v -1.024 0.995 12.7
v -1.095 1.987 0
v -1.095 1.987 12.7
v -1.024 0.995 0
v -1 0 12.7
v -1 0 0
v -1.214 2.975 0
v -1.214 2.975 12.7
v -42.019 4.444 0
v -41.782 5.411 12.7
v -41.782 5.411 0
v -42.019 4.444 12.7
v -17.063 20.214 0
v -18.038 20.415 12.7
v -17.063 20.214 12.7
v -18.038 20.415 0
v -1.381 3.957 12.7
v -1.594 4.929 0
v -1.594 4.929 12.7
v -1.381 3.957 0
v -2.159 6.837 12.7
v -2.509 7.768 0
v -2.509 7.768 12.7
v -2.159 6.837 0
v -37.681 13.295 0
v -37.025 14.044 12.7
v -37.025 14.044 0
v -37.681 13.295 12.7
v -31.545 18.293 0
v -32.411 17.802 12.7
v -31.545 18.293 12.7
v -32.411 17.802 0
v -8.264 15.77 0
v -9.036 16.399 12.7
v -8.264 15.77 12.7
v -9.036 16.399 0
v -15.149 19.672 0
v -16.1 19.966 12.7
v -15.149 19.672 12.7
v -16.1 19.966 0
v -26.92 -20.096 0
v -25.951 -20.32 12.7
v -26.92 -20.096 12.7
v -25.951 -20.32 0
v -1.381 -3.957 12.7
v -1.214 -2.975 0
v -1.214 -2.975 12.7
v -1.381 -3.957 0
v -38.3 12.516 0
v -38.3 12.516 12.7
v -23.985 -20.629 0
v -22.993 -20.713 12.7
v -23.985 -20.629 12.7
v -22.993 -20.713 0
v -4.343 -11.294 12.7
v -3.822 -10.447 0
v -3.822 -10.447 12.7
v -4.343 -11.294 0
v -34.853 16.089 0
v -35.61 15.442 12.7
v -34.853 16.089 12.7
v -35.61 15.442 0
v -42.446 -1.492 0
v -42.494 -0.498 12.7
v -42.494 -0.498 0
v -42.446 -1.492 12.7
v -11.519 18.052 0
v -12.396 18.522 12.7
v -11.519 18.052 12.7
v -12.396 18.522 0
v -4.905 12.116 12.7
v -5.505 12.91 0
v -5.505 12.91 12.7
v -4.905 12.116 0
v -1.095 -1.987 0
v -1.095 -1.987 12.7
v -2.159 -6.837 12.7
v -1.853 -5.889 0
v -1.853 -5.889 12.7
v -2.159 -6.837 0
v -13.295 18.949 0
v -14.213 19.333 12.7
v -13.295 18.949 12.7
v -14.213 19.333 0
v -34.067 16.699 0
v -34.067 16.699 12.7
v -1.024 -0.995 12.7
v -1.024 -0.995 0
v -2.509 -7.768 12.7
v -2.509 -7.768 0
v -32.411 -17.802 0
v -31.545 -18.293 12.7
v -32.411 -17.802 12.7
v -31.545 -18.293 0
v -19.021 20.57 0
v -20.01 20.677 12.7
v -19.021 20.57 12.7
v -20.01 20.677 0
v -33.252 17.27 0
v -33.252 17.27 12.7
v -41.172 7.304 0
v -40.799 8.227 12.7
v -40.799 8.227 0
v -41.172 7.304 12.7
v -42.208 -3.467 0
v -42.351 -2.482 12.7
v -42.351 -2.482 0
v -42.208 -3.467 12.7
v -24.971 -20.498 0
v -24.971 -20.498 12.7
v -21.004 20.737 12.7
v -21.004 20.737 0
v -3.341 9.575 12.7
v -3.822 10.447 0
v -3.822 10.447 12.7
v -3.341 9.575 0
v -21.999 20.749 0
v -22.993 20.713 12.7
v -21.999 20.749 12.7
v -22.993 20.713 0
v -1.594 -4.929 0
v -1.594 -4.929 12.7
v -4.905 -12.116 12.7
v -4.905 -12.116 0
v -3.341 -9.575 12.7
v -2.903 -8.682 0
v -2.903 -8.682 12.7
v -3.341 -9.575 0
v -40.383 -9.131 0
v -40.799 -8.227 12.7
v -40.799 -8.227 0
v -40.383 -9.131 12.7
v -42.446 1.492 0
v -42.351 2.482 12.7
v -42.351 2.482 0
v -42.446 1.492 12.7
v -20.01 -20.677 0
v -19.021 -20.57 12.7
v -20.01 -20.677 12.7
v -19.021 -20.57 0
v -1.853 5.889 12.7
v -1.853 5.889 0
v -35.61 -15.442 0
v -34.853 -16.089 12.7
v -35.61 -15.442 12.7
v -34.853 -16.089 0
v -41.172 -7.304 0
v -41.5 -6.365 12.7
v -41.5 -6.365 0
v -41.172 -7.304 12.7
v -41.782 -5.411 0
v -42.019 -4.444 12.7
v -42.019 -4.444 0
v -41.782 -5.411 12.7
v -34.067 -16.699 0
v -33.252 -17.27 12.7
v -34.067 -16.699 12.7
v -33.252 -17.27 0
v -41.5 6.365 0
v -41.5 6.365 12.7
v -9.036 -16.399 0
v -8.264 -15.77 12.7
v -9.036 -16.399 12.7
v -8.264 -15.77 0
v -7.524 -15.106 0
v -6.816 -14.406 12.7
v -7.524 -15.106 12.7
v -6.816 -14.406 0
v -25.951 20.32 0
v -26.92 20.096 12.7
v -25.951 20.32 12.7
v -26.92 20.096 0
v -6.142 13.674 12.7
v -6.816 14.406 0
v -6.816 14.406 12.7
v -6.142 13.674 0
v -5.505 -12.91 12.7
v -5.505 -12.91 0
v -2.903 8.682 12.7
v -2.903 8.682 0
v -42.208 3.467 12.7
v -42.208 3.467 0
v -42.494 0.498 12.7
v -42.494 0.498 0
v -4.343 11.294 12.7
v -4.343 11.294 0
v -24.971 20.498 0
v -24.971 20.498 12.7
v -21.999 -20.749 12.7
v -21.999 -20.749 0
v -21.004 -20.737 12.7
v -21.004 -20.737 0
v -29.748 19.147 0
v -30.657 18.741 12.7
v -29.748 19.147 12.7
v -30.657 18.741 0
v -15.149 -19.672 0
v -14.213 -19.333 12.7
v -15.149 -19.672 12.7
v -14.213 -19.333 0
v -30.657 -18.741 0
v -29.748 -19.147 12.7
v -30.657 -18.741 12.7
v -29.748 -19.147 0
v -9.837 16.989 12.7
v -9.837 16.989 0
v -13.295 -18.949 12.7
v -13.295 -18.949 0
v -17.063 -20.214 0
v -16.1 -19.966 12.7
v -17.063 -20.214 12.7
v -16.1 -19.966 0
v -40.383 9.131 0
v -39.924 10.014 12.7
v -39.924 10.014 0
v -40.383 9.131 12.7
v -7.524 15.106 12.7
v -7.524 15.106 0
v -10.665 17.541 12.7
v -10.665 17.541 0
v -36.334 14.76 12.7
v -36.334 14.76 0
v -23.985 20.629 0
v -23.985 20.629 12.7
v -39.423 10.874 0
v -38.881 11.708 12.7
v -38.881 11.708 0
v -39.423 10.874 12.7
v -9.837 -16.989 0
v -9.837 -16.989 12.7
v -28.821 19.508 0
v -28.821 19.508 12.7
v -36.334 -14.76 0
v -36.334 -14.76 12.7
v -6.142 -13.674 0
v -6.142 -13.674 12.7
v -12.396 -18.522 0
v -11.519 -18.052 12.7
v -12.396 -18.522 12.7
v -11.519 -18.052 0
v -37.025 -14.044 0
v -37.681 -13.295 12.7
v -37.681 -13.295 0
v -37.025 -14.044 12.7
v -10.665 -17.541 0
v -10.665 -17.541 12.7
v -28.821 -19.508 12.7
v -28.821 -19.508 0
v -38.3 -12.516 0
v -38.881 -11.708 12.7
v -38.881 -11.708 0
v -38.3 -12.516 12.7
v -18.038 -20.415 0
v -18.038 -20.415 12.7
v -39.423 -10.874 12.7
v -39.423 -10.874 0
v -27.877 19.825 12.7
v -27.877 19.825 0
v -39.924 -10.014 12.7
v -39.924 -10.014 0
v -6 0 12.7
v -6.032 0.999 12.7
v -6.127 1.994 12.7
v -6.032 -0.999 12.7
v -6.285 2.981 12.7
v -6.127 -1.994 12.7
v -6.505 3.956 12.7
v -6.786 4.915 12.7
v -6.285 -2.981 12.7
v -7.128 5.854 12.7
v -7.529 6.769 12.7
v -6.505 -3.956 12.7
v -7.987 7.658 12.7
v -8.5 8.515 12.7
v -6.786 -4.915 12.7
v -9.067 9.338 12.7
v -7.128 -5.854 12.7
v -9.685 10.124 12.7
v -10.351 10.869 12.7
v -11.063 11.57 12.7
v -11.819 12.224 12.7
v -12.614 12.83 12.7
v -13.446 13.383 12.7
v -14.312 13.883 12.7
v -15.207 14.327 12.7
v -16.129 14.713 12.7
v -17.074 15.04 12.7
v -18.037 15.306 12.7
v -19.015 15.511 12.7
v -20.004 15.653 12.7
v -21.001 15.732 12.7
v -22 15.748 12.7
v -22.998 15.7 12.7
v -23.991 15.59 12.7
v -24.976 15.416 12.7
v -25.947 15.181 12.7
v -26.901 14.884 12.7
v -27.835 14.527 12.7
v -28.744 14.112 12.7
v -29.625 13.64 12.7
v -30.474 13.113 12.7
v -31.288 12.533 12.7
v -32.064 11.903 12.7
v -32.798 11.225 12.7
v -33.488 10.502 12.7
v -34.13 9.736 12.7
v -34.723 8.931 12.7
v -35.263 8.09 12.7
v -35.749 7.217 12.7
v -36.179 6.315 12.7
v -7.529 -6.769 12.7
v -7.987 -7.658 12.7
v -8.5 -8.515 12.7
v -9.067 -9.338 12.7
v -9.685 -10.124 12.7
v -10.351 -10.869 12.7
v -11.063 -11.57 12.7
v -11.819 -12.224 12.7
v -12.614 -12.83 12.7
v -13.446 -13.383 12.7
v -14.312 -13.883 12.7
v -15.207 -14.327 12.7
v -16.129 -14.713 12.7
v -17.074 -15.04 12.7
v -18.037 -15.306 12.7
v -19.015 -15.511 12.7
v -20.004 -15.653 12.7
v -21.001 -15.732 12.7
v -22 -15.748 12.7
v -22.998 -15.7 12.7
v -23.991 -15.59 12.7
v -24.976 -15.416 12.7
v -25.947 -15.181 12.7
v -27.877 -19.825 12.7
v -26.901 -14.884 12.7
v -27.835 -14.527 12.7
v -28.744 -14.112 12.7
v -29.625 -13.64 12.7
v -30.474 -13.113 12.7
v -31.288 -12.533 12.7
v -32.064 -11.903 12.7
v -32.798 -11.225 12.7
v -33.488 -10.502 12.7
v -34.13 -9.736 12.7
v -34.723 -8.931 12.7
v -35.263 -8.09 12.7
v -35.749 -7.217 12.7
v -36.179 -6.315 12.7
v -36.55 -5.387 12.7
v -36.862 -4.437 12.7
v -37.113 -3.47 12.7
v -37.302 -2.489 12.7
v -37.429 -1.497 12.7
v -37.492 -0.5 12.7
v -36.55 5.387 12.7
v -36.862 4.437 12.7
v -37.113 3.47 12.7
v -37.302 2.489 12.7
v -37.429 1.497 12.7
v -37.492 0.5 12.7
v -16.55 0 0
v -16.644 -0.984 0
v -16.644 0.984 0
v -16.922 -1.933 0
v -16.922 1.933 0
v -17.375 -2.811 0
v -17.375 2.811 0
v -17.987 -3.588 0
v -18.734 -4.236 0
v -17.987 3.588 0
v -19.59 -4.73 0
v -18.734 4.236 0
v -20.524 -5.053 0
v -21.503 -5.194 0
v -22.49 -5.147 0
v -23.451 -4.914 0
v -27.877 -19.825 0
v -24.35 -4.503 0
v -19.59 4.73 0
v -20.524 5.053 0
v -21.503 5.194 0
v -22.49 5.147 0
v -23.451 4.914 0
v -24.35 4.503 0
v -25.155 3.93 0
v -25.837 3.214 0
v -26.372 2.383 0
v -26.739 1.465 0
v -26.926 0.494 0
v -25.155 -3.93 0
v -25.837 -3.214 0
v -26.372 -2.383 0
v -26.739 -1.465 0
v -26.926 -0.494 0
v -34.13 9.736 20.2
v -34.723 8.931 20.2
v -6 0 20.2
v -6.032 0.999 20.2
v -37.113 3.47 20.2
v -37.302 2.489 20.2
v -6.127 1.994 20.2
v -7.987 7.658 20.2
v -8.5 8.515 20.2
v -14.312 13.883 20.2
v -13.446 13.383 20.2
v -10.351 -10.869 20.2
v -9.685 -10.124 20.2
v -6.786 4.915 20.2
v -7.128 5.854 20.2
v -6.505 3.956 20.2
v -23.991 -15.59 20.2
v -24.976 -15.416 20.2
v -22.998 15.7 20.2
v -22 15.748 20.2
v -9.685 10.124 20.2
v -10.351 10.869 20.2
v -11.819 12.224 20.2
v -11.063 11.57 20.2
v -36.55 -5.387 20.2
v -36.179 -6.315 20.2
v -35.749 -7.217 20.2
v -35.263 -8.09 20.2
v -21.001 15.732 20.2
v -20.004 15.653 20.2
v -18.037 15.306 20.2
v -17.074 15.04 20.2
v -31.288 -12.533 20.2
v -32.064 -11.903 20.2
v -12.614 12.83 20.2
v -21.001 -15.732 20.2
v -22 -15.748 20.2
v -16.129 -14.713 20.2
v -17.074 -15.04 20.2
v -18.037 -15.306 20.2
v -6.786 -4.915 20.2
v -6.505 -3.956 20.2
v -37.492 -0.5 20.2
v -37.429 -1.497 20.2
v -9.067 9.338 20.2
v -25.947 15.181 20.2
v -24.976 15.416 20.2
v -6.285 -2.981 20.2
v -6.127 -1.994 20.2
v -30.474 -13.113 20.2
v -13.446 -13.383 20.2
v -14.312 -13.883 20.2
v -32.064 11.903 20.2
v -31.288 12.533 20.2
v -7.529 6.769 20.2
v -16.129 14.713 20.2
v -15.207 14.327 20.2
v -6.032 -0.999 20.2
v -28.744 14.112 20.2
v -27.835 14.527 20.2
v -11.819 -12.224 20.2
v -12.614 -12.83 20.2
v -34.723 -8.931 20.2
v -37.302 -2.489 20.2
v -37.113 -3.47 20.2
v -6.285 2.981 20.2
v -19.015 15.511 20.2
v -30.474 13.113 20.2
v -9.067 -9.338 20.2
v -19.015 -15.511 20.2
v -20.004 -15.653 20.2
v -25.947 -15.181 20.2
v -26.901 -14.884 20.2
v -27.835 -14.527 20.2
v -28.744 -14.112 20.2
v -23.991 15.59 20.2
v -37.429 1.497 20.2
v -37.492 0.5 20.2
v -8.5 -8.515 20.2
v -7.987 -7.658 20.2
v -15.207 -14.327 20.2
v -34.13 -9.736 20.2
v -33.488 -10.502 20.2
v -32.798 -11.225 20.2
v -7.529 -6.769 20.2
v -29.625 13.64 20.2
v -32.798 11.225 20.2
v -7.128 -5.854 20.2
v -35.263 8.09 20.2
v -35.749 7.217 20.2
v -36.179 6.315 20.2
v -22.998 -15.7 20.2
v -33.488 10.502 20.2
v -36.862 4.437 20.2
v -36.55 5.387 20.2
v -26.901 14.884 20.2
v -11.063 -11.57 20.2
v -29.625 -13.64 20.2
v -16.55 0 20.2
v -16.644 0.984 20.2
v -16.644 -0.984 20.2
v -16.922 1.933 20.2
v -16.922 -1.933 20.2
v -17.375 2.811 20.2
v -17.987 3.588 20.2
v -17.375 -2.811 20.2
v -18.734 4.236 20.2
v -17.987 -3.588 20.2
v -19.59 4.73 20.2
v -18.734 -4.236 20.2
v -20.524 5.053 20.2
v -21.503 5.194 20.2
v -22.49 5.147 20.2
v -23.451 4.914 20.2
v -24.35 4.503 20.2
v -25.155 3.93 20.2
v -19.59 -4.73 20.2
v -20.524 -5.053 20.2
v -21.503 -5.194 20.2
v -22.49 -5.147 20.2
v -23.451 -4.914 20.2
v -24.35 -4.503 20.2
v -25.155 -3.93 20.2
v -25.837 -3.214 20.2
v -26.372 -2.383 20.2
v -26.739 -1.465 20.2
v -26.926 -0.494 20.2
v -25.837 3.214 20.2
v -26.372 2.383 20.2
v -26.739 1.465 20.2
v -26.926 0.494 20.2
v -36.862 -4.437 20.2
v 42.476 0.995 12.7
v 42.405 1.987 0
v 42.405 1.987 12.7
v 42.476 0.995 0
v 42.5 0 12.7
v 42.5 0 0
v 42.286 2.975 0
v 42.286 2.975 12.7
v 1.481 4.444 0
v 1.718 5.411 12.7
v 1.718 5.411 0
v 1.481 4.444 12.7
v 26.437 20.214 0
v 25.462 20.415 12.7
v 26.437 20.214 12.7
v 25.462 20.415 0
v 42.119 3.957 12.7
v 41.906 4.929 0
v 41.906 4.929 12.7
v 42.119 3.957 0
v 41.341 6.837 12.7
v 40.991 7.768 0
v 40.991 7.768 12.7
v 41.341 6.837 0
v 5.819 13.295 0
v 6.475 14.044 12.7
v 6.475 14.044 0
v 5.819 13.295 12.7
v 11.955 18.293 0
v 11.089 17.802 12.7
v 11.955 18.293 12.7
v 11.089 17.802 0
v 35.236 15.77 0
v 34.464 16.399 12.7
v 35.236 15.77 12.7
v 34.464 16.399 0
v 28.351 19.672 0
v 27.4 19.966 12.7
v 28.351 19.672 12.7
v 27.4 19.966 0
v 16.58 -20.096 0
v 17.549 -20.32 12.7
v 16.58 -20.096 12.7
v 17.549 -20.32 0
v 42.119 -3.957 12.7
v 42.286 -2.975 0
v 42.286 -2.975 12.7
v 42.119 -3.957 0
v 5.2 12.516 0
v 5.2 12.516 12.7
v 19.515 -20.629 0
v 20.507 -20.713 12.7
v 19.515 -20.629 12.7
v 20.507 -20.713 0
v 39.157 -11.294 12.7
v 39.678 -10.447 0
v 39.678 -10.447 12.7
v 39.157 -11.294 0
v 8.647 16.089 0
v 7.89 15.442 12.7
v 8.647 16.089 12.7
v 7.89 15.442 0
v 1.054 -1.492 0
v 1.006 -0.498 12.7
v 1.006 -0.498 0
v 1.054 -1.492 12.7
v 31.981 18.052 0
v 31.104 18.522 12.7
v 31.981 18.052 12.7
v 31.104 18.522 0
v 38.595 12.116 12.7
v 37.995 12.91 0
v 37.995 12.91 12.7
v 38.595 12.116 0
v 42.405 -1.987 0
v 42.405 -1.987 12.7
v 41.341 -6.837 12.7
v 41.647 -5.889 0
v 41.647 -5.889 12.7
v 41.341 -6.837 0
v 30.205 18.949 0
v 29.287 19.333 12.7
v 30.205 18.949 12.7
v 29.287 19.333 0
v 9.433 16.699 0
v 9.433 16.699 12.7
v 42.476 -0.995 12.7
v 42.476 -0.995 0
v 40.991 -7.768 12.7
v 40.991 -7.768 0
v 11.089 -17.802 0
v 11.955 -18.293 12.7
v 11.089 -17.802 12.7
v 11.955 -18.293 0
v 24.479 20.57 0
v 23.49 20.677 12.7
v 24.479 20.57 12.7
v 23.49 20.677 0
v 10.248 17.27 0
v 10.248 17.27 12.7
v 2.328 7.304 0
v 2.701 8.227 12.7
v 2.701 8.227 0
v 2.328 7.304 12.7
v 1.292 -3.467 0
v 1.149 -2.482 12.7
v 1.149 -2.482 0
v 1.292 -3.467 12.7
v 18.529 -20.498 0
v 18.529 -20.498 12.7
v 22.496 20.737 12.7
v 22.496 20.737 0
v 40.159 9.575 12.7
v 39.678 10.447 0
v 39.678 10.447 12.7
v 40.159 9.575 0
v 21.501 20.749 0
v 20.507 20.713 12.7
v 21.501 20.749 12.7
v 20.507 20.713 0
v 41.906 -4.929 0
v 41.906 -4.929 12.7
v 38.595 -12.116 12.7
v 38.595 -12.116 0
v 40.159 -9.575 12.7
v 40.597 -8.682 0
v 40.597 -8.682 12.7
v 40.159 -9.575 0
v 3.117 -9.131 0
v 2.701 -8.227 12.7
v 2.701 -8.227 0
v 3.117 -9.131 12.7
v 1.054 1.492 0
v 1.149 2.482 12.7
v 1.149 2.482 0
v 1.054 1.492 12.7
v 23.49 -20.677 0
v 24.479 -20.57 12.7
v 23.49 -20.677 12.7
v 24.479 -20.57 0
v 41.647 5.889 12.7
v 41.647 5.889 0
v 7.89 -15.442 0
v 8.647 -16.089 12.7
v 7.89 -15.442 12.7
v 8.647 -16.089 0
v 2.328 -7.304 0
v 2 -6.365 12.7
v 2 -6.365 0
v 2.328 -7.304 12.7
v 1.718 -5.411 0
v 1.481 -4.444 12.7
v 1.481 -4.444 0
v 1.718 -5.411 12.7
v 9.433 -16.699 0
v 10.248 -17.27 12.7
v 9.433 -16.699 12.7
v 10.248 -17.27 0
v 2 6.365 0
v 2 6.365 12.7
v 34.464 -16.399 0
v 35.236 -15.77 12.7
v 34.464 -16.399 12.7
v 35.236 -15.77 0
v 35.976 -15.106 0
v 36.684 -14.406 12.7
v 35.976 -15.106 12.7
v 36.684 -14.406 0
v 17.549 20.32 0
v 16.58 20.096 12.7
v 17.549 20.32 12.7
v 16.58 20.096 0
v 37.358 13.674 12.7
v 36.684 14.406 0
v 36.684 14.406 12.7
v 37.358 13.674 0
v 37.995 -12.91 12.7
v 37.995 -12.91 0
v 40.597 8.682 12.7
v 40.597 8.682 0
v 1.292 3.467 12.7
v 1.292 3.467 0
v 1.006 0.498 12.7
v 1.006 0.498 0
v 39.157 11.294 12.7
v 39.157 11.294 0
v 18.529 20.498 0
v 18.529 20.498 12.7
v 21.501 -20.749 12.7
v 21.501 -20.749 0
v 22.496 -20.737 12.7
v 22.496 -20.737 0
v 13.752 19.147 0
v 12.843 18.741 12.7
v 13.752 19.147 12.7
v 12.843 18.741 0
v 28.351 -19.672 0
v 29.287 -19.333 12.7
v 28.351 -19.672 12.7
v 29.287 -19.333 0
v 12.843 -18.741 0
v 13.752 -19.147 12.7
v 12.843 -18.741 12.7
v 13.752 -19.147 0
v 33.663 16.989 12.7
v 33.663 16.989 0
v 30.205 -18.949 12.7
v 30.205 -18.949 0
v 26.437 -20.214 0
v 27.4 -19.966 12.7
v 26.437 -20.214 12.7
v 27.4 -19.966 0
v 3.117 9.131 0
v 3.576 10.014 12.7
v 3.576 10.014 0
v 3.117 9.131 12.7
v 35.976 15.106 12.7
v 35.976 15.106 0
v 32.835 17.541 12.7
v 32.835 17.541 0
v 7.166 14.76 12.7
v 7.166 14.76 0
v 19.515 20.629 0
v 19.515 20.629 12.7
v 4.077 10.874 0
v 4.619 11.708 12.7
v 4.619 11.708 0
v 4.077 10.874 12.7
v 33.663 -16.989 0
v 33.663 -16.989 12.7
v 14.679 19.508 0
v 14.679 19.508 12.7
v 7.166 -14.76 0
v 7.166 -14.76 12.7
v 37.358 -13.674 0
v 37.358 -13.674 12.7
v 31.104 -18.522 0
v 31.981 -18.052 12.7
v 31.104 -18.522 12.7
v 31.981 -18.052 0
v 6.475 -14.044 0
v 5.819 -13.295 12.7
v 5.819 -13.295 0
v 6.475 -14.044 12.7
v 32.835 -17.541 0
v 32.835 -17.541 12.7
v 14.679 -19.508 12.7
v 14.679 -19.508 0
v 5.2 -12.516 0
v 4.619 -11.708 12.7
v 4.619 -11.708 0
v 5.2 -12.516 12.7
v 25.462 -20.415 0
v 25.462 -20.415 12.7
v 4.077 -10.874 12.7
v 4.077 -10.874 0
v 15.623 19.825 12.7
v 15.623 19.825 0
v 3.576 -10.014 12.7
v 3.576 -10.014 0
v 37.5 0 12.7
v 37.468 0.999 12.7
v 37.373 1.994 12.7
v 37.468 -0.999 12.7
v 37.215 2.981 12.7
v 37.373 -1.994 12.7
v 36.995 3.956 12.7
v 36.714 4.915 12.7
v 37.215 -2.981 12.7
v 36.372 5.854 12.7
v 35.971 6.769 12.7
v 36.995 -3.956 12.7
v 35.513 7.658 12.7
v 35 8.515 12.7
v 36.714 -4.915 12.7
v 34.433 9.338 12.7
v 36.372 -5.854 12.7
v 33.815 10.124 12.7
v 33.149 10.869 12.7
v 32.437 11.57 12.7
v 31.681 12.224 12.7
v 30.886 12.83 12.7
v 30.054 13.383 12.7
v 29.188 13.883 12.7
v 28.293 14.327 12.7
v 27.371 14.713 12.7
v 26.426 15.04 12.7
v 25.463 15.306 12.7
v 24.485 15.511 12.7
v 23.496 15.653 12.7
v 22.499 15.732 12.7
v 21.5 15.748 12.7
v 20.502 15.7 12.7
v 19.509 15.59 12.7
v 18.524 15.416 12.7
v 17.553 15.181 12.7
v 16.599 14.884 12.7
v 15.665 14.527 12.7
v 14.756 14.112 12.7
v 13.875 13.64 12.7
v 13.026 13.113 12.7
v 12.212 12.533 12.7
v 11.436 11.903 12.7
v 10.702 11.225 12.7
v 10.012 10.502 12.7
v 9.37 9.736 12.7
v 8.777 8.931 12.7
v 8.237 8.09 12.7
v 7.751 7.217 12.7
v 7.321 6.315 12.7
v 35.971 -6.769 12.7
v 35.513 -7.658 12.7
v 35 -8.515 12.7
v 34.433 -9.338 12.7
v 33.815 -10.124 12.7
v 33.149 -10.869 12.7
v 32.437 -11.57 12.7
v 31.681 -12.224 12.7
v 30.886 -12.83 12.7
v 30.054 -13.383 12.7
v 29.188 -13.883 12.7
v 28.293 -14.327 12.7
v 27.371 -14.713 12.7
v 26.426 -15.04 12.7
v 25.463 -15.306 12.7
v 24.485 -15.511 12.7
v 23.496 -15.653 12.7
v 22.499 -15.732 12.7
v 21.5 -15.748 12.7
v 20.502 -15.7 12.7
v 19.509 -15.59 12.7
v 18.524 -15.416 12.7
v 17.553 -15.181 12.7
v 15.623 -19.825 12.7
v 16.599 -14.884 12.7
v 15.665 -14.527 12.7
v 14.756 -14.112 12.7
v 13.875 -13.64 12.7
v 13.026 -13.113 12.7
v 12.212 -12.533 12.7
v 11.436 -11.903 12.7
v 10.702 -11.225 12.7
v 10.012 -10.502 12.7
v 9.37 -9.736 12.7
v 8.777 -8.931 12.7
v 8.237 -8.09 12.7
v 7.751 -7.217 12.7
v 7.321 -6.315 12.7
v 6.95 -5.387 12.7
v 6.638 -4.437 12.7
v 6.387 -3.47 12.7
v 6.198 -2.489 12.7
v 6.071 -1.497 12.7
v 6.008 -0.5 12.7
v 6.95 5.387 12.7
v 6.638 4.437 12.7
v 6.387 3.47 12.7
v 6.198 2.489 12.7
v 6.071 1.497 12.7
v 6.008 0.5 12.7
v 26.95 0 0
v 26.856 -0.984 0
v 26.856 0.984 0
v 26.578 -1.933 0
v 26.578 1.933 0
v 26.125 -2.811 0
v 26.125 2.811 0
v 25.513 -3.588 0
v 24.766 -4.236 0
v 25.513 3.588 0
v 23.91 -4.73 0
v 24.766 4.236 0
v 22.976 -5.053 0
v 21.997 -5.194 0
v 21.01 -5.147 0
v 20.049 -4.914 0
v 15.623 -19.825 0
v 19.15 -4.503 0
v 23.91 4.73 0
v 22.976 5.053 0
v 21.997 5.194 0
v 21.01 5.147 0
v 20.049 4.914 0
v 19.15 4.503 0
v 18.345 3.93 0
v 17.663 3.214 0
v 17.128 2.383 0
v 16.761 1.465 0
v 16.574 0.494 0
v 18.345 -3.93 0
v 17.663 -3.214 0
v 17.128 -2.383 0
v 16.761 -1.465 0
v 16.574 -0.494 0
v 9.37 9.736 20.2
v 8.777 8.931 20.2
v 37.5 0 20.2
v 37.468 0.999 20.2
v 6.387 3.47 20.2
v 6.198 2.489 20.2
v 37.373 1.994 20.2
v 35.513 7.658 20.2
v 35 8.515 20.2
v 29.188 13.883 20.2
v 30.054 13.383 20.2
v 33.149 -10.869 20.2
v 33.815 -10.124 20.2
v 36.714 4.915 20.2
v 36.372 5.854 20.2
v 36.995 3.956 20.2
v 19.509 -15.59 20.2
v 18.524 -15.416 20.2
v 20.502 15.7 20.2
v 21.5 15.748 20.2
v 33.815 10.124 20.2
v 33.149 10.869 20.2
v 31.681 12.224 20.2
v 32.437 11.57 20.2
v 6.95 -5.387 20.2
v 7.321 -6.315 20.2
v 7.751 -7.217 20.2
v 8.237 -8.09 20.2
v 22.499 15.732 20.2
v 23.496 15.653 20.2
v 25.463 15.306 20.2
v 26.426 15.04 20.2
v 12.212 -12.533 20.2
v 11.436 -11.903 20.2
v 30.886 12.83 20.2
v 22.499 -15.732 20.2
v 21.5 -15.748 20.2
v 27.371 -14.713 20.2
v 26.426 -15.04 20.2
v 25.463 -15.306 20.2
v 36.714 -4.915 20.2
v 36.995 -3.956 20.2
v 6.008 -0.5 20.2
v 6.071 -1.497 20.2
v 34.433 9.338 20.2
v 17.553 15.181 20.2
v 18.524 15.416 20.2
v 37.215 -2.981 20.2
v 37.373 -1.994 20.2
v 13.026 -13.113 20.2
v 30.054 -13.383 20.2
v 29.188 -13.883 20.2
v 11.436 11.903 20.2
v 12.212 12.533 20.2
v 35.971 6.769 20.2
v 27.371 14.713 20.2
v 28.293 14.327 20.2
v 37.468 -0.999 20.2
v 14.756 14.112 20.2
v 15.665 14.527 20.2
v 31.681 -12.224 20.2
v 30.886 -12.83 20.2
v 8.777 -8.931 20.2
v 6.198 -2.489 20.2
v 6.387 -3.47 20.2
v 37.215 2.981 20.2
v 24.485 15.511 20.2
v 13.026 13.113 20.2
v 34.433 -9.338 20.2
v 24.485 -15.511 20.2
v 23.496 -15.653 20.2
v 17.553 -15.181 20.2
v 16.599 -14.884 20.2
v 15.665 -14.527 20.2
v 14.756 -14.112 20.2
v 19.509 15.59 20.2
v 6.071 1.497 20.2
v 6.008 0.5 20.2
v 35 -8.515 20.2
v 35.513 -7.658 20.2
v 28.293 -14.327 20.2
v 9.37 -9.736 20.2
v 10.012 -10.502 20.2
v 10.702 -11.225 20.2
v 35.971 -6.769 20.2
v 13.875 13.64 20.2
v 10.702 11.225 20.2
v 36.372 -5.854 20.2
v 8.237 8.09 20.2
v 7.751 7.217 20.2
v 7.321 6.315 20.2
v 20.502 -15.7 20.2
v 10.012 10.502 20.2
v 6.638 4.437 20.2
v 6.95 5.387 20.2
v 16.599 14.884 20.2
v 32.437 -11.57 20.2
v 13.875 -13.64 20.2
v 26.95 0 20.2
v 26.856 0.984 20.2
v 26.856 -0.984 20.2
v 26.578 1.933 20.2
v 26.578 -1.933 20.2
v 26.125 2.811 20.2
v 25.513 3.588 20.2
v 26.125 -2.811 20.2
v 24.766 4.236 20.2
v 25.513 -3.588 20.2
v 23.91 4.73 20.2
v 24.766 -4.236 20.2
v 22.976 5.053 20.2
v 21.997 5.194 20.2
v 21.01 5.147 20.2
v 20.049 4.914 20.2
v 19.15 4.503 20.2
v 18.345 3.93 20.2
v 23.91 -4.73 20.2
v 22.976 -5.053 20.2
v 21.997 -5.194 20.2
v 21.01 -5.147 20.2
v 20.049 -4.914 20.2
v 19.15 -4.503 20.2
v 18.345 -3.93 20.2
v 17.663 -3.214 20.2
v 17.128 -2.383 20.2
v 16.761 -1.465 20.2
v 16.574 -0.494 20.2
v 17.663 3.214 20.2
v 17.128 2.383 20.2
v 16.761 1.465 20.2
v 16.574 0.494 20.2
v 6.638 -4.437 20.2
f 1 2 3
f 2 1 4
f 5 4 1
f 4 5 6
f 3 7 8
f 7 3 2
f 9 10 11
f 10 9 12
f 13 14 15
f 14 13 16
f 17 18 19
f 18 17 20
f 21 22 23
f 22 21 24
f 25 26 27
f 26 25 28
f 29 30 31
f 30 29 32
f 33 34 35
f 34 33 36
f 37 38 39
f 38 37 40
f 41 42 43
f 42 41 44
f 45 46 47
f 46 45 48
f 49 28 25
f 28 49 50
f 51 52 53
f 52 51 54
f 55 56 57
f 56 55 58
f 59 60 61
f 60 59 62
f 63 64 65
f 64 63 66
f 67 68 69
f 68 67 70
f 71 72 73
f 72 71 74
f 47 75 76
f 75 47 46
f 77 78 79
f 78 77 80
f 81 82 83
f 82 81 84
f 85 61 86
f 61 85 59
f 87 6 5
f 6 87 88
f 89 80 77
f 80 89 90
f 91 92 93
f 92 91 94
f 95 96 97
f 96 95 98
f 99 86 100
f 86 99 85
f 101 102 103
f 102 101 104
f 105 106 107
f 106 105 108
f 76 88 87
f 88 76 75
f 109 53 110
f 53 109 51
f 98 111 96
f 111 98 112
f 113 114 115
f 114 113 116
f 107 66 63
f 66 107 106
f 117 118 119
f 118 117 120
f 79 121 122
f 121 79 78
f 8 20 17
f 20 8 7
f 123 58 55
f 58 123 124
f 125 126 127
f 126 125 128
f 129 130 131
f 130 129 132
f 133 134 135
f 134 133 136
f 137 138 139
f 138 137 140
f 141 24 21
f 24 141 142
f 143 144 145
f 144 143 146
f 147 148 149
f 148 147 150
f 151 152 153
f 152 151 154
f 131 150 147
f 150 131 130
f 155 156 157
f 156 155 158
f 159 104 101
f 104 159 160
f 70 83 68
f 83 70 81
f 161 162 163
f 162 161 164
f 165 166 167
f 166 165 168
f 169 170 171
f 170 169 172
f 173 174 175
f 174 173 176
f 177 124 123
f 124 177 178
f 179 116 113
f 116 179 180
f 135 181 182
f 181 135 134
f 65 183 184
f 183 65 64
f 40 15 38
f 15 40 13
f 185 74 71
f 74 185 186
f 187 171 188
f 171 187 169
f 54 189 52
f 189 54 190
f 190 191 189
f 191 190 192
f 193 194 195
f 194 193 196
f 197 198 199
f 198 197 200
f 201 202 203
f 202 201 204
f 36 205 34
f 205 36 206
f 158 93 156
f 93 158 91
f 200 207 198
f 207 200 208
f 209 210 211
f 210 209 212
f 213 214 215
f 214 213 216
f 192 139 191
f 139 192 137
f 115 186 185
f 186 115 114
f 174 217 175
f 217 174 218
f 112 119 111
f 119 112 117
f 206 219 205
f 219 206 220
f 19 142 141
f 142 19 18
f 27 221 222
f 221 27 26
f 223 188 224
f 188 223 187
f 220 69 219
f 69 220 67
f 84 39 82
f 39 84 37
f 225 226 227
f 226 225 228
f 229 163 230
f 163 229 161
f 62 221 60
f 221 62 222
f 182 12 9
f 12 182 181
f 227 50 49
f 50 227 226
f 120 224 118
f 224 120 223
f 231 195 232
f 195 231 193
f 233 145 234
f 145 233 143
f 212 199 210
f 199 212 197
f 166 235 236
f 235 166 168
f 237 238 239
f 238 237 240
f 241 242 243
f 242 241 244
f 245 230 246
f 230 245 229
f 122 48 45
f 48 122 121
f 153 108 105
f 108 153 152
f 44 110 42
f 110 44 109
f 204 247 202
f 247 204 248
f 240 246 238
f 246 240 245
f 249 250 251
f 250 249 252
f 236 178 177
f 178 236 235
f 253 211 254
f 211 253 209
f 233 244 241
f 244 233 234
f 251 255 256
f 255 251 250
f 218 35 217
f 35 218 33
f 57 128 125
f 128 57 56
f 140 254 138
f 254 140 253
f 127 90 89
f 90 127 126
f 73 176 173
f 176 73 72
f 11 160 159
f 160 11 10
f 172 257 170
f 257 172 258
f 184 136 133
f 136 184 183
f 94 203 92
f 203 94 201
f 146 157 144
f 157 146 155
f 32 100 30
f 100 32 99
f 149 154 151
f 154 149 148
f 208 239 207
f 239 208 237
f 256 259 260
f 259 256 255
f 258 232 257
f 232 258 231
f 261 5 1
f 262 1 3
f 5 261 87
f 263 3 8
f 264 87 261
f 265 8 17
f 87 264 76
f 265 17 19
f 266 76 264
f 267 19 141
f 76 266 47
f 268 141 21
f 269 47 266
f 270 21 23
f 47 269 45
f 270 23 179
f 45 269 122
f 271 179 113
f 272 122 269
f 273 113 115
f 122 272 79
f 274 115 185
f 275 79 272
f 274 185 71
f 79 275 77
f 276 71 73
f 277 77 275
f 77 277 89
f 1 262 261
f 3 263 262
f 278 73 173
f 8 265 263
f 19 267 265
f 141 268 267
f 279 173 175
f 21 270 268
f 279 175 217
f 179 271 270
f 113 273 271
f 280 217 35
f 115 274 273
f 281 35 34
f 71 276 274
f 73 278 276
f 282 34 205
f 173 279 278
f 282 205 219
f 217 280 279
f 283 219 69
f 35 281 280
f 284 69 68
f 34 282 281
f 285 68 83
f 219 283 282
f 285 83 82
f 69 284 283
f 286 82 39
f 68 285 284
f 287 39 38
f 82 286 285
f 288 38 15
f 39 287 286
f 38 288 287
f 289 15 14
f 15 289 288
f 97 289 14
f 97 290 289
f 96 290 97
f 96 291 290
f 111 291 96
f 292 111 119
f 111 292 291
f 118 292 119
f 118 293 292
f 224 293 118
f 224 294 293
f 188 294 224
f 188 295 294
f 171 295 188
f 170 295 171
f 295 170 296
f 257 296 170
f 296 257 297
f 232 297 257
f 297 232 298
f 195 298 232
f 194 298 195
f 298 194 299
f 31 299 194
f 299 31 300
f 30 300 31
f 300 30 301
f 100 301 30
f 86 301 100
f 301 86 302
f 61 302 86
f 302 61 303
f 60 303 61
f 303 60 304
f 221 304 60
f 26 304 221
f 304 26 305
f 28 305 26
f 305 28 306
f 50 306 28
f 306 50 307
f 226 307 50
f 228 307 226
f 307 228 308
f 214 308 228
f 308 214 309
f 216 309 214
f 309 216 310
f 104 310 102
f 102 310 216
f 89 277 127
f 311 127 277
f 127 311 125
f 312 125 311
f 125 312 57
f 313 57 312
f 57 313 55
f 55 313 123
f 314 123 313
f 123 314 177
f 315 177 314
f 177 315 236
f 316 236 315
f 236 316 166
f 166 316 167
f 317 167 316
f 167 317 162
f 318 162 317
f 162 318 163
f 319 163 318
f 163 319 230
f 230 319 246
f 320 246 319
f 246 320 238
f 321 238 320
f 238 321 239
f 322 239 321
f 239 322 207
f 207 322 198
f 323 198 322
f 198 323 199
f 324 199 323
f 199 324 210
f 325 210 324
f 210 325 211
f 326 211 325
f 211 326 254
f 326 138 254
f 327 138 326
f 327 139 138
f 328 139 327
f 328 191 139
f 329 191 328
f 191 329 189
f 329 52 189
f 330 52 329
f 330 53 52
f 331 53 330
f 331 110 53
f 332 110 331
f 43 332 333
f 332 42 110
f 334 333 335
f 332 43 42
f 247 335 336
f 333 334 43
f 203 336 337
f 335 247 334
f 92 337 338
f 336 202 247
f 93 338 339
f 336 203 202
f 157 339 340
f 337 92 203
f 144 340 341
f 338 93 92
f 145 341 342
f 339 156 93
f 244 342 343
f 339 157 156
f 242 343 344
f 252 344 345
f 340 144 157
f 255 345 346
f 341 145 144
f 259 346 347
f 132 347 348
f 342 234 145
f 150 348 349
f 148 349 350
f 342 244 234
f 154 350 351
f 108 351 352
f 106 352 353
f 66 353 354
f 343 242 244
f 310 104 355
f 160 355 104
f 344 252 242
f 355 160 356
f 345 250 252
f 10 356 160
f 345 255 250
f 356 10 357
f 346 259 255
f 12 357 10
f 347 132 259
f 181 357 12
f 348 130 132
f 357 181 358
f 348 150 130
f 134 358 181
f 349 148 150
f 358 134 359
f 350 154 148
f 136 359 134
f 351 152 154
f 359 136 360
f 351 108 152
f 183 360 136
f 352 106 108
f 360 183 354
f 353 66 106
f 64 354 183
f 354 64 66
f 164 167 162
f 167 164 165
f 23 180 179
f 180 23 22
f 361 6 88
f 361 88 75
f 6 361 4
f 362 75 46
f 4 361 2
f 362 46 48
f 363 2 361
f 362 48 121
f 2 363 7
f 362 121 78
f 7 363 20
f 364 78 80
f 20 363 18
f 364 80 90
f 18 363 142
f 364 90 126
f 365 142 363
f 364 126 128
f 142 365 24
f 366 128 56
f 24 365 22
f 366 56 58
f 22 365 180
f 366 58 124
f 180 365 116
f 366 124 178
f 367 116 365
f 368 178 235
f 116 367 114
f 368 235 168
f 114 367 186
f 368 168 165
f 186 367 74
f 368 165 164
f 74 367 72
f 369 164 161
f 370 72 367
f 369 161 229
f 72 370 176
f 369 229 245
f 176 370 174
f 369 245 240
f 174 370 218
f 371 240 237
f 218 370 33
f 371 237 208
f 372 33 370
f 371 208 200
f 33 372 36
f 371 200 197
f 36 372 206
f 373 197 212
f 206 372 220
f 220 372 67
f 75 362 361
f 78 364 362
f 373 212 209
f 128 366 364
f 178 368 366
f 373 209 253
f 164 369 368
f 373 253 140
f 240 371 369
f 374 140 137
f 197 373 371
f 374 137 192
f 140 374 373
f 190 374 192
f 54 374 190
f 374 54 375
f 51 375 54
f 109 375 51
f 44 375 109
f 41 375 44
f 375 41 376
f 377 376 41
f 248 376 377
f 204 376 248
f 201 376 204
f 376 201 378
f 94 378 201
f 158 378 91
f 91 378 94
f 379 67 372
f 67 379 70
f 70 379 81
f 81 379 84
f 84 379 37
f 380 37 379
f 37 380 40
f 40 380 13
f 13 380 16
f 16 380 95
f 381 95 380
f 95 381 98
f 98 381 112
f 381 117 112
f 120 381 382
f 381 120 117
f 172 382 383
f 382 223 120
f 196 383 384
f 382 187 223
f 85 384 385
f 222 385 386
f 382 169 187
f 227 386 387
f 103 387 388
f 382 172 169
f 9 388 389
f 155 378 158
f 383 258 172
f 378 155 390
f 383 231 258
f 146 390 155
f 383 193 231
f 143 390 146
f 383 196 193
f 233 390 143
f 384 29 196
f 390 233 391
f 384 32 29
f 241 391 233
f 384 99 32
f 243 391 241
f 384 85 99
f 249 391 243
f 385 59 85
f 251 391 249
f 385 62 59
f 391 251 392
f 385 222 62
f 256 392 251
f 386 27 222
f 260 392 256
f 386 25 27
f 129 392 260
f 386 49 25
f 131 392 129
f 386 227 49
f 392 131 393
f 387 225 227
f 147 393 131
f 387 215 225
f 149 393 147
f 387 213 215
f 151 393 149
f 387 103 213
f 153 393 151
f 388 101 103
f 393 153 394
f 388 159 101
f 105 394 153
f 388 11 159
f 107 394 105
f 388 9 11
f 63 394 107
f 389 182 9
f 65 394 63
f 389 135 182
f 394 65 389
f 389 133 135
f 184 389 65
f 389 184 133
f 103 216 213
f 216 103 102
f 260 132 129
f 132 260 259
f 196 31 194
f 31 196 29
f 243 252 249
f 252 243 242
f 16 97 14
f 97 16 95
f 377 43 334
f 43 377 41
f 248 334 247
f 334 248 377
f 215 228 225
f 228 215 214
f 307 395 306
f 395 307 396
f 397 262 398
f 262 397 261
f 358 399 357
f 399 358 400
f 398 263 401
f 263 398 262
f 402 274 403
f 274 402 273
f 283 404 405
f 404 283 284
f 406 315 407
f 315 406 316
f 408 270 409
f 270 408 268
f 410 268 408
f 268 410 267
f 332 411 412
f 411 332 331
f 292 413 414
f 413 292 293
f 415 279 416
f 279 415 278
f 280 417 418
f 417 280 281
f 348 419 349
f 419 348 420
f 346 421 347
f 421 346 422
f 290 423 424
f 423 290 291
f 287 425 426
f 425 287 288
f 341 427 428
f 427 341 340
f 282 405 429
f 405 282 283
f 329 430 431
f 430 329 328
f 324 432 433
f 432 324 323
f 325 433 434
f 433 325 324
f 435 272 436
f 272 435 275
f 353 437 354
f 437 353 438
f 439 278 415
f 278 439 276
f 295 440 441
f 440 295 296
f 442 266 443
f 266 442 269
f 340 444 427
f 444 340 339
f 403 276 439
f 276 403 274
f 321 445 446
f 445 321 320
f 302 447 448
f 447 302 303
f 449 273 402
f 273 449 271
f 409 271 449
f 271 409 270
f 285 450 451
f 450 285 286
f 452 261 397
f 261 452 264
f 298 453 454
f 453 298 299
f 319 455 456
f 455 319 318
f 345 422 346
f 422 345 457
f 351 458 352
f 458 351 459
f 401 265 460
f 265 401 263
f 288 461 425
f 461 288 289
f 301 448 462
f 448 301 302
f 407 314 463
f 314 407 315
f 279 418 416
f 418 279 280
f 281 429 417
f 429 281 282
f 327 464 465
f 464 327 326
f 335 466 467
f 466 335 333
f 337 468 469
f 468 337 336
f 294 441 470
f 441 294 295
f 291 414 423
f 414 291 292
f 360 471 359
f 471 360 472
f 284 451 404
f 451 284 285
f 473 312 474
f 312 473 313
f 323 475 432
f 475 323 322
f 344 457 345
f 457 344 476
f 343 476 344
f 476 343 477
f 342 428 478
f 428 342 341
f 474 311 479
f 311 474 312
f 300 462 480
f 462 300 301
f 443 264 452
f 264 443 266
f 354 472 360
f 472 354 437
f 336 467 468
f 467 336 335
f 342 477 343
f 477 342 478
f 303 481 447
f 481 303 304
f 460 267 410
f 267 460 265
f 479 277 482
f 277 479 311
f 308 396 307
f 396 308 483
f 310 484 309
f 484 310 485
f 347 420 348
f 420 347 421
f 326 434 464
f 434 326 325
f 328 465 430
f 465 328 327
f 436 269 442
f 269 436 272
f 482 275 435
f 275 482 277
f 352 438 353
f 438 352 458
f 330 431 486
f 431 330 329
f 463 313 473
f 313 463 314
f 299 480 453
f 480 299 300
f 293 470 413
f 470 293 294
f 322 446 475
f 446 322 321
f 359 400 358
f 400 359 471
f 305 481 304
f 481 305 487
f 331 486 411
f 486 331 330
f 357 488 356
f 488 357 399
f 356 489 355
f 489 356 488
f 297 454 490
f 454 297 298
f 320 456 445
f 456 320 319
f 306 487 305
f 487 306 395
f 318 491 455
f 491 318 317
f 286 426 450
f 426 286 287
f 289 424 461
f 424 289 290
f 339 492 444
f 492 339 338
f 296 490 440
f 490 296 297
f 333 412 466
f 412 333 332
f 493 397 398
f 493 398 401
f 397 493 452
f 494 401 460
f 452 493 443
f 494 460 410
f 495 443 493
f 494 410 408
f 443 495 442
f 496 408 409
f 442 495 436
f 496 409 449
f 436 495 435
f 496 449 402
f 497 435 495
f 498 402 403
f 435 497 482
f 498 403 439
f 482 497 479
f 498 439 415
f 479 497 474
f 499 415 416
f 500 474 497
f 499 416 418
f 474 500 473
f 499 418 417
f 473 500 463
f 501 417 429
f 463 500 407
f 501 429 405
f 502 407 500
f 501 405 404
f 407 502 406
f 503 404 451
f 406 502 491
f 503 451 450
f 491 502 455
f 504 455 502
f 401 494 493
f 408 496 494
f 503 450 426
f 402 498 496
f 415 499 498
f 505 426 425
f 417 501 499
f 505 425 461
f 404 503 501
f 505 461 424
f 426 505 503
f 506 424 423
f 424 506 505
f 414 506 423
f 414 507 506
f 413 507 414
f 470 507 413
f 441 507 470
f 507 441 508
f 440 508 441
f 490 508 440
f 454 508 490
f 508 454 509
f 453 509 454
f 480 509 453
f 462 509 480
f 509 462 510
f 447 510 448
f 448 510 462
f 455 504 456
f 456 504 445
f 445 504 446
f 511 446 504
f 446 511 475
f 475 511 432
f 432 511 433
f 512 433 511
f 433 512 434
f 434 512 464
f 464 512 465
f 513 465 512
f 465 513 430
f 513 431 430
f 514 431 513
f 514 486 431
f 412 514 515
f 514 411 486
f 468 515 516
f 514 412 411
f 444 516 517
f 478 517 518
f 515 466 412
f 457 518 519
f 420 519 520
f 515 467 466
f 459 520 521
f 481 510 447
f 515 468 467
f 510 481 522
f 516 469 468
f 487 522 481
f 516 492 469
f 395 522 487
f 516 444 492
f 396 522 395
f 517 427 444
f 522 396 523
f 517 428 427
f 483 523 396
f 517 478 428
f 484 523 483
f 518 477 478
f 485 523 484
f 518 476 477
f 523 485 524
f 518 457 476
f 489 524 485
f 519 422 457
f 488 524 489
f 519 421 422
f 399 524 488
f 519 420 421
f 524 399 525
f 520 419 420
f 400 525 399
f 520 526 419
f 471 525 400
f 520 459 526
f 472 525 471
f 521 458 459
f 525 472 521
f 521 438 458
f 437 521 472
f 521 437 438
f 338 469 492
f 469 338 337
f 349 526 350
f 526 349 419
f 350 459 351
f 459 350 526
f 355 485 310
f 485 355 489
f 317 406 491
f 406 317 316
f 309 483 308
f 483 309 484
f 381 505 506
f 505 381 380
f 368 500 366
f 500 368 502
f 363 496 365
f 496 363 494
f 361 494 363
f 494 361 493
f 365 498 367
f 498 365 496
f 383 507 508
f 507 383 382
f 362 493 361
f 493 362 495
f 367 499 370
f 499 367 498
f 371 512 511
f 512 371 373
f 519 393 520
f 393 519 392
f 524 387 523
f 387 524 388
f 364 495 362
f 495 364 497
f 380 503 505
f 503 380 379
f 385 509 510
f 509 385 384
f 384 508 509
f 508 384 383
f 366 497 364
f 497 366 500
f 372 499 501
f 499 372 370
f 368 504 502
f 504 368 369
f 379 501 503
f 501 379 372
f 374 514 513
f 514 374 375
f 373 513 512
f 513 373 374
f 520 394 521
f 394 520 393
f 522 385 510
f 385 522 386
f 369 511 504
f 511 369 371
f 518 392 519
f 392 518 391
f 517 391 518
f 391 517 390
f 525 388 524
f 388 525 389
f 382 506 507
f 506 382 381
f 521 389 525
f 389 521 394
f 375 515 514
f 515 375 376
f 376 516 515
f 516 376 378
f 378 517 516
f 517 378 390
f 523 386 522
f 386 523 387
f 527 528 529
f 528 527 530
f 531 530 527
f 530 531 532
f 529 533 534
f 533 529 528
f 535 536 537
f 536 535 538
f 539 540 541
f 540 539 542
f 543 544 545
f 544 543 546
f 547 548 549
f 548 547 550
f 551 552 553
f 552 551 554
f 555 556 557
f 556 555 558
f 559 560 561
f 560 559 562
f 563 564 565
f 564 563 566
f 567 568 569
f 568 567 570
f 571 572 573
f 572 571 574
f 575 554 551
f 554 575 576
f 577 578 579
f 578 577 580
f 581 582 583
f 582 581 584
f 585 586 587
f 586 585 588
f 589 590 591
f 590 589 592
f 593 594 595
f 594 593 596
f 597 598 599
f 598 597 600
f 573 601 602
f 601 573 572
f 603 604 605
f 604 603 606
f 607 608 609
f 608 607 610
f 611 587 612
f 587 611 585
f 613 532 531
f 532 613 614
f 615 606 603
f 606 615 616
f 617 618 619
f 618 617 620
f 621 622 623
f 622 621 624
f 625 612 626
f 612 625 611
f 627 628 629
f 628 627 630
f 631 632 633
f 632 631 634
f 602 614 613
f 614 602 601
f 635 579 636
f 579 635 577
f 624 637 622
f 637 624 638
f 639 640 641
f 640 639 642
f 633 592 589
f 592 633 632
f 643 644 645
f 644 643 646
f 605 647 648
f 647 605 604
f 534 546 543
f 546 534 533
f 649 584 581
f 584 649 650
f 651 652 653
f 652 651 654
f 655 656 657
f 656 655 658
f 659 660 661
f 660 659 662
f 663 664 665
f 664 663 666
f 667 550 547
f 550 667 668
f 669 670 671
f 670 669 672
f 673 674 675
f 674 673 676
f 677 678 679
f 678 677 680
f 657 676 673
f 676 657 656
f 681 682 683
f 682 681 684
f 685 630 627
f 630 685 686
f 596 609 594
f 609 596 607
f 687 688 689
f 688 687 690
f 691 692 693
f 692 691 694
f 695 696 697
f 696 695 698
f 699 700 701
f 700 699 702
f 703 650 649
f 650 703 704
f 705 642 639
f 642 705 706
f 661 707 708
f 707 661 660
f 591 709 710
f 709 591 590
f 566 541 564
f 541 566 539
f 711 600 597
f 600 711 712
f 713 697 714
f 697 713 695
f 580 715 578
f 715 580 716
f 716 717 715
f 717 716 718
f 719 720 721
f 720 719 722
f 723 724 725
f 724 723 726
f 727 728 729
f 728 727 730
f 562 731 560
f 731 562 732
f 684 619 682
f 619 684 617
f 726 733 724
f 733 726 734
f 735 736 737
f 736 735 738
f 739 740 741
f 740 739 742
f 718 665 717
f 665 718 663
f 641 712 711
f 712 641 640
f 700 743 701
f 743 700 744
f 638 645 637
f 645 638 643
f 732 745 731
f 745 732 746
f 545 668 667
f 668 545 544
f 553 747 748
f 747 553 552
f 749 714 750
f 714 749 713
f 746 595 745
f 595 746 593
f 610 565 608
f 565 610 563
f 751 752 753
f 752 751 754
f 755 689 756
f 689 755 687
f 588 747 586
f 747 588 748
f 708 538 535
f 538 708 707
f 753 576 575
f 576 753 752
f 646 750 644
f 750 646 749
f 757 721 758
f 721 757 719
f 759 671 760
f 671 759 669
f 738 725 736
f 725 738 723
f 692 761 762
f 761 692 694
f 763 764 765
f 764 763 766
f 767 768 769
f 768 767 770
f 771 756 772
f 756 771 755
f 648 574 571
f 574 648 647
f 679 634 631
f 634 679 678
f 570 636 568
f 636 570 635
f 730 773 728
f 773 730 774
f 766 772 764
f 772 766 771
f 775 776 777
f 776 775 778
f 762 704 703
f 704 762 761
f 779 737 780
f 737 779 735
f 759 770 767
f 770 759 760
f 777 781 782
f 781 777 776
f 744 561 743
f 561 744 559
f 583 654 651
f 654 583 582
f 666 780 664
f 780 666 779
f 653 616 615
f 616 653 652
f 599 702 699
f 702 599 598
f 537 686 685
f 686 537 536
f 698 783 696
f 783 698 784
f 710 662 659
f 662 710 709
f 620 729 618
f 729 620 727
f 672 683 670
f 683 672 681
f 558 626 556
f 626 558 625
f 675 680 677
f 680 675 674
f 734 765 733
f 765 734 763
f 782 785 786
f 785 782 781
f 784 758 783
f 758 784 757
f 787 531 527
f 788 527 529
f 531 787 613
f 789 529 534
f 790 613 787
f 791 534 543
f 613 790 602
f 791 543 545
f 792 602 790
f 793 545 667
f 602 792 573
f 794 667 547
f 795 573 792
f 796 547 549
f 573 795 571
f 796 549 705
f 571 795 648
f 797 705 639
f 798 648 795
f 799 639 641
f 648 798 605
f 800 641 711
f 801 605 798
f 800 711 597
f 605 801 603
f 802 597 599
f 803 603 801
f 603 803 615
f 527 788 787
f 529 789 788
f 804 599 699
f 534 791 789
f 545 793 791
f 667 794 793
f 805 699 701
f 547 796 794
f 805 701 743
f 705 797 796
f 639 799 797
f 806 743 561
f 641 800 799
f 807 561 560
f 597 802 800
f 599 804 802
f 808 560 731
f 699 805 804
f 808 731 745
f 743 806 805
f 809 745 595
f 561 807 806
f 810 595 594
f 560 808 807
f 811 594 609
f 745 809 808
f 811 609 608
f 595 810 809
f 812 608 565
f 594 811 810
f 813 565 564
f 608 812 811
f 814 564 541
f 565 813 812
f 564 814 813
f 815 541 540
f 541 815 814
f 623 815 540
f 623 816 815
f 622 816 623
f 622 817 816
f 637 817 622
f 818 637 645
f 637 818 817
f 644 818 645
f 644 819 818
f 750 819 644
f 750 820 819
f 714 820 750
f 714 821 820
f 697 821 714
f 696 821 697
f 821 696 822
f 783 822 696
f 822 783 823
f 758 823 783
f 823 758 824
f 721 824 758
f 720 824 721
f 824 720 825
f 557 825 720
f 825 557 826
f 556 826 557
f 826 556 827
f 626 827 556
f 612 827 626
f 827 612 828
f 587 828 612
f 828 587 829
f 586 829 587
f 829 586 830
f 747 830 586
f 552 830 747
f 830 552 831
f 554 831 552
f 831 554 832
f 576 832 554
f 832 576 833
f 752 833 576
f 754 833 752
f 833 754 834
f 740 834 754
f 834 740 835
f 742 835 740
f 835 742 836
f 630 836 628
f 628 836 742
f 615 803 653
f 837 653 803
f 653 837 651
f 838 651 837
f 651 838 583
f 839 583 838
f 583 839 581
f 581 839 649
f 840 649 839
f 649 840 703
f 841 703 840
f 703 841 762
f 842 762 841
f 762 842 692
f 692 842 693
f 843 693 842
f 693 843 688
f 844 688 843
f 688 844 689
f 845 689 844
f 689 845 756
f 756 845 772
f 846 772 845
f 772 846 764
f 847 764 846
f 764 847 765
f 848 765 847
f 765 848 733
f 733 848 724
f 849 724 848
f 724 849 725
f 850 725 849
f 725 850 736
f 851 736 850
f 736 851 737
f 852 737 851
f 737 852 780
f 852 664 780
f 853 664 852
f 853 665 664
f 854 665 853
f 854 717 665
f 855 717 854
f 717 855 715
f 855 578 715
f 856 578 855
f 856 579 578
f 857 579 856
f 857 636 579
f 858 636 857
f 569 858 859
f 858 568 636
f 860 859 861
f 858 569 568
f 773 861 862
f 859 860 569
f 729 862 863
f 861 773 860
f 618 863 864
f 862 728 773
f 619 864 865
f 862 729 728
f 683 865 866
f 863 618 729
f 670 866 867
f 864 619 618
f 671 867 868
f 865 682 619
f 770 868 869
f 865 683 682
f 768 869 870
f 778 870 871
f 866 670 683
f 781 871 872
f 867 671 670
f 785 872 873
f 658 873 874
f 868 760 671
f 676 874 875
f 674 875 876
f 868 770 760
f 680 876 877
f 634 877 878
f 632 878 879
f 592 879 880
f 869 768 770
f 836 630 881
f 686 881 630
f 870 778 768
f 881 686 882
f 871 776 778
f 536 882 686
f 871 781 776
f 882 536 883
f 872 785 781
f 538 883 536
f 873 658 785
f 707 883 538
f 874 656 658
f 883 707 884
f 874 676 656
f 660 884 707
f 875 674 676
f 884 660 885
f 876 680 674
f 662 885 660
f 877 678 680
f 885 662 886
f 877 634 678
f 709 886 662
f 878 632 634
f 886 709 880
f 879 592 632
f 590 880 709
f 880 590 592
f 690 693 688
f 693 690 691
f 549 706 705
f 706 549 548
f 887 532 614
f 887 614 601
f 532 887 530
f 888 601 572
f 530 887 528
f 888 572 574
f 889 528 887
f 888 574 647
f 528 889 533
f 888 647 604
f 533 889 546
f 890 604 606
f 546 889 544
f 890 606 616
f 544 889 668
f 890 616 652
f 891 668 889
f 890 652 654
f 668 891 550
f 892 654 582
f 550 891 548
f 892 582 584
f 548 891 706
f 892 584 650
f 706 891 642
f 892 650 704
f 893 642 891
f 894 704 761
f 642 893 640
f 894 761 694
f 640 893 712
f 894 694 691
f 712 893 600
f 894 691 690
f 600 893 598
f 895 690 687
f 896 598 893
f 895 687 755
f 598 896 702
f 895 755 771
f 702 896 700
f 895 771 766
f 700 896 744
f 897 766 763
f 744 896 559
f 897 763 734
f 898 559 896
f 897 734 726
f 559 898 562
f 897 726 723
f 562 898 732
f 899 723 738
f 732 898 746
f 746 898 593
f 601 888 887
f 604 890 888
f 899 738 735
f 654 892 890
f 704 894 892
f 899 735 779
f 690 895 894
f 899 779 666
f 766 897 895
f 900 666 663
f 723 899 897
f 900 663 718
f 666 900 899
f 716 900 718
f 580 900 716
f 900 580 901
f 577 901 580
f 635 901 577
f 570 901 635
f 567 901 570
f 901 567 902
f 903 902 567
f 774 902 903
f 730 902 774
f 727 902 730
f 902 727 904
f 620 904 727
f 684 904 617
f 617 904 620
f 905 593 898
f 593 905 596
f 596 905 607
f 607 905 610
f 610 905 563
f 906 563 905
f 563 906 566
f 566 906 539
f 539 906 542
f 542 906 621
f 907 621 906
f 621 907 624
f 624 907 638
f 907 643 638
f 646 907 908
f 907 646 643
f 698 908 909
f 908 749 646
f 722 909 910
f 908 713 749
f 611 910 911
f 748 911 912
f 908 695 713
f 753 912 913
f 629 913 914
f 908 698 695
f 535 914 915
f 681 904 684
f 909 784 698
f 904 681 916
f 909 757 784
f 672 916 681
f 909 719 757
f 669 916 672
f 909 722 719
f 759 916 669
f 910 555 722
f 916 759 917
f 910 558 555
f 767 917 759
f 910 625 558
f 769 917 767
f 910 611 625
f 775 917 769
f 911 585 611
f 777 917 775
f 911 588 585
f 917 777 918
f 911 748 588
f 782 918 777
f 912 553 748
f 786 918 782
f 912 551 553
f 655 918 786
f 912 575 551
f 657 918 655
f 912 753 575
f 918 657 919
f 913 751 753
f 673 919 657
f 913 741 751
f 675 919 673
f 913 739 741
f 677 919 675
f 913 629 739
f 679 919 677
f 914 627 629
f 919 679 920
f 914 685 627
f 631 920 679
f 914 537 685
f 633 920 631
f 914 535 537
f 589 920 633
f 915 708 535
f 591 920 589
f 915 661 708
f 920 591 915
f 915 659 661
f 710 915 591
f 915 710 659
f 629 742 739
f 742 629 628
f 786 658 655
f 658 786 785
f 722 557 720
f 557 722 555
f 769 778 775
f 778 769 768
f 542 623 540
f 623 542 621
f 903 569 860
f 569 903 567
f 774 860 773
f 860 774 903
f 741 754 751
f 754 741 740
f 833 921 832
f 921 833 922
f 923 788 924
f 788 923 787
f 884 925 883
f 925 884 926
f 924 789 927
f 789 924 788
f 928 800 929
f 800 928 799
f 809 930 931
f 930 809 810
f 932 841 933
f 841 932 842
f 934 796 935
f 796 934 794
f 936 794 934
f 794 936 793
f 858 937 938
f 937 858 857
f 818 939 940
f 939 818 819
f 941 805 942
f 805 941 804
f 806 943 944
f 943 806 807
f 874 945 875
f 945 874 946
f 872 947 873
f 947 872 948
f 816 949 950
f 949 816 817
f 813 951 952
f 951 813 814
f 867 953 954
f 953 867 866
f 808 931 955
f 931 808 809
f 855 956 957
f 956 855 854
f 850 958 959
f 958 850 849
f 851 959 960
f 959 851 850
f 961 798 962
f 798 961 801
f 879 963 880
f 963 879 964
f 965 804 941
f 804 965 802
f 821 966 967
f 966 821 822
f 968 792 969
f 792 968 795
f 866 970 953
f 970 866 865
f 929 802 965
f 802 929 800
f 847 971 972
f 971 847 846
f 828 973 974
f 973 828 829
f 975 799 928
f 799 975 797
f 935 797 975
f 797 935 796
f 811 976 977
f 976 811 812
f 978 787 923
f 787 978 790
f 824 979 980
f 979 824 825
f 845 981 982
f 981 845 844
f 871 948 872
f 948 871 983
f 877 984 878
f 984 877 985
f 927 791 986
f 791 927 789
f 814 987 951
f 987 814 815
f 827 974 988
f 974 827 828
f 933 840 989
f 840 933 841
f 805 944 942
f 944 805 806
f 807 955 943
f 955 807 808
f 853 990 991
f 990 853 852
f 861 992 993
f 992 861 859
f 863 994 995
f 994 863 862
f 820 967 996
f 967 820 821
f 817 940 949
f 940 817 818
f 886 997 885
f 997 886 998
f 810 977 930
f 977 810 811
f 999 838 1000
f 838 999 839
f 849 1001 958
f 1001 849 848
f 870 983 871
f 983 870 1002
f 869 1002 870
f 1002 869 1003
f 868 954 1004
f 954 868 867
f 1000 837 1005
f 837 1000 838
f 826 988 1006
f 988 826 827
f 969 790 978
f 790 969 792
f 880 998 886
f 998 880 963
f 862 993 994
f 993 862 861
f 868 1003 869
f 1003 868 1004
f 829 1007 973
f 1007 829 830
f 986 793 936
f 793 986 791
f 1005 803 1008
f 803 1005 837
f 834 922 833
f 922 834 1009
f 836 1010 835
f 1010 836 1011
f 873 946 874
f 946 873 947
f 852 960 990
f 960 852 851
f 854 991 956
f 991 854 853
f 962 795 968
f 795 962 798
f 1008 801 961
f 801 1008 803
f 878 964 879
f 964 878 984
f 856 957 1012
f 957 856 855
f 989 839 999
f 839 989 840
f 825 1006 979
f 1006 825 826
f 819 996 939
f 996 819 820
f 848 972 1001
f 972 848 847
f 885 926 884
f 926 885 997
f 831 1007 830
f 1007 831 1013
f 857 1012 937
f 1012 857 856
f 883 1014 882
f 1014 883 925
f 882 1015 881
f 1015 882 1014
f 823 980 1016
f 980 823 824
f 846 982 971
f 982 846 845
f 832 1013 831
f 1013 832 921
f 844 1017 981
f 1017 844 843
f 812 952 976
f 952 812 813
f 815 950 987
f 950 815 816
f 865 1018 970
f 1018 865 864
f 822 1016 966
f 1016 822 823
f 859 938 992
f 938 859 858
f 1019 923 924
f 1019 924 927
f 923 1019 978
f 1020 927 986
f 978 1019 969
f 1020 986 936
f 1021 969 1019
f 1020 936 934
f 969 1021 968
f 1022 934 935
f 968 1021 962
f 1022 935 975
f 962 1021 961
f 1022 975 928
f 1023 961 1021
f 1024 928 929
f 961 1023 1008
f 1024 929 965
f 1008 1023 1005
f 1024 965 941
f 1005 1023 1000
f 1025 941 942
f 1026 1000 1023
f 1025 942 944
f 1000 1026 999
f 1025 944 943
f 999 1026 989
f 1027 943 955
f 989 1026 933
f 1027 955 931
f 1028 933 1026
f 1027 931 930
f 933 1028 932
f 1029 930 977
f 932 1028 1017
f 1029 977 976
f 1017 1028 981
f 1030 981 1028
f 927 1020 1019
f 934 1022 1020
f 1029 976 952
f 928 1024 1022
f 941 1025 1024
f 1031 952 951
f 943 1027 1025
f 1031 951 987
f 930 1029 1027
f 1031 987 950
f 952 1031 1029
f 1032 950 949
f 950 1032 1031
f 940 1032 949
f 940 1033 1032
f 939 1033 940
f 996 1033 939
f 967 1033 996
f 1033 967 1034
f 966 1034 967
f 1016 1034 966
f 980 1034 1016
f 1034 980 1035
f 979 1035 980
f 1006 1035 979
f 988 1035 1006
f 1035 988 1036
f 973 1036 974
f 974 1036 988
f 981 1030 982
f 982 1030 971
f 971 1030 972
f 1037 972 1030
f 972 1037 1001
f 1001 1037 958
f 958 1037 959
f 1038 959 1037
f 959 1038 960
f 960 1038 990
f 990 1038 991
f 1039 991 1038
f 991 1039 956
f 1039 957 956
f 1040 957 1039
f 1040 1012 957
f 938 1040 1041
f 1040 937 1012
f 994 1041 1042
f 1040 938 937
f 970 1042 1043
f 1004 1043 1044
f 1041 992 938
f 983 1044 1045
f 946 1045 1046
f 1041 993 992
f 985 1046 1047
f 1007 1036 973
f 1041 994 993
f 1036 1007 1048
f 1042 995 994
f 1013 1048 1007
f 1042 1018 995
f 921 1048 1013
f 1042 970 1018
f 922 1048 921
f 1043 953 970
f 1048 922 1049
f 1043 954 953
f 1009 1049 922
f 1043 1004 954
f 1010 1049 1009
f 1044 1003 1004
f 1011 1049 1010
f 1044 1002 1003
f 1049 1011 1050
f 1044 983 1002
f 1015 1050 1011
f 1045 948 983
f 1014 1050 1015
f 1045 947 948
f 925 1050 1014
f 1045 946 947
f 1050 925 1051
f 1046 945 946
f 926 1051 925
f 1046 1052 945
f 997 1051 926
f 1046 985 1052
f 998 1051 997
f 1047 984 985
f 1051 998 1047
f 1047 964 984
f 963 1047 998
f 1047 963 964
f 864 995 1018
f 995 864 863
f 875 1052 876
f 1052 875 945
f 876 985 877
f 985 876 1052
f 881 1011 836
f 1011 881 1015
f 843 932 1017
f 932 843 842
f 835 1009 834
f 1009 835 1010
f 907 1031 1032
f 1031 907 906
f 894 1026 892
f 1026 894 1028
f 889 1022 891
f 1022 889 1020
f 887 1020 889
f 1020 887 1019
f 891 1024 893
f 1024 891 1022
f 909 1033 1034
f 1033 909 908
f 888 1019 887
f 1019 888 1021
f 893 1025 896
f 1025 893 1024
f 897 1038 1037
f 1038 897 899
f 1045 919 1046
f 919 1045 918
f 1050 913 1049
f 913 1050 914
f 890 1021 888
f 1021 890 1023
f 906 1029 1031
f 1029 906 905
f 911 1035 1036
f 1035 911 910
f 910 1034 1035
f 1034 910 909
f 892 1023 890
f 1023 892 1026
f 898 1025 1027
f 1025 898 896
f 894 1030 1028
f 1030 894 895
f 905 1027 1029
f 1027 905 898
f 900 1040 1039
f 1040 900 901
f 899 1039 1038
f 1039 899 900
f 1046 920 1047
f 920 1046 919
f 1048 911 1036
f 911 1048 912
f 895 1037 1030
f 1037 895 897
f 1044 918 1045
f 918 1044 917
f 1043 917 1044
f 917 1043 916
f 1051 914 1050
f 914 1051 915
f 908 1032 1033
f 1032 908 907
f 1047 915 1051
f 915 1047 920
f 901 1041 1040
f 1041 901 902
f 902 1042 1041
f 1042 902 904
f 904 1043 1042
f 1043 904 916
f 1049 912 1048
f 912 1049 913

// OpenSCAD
// [FL_INDEX: keywords="openscad, 3d_parametric, Customizable_Spool_Adapter, csg_solid" | COT="Parametric OpenSCAD design from 3DCodeverse"]
// Title: Customizable Spool Adapter

//design and code by emanresu (http://www.thingiverse.com/Emanresu)
//Generates two symmetric spool bearings/axel adapters/what have you
//spacer can be used to center the spool on a specific axel,
//or to simply keep the bearing/axel adapter from sliding into the spool


//CUSTOMIZER VARIABLES


//diameter of spool hole (mm)
spool_hole_diameter=31.5;

//distance bearing sticks into spool hole (mm)
spool_hole_depth=15;

//diameter of the axle (mm)
axel_diameter=10.4;

//height of spacer (mm) (useful for centering a spool) 
spacer=12.7;
//e.g. 0 = no spacer; 10 = a 10mm extension of a wider diameter

//extra diameter of spacer (mm)
spacer_diameter=10;
//(e.g. 0 = spool_hole_diameter; 10 = spool_hole_diameter + 10)

//closest distance between bearings on platform (mm)
separation=2;

/* [Hidden] */

//set openSCAD resolution
$fa=1;
$fs=1;


  //////////////////
 // Control Code //
//////////////////

//Right bearing
translate([-spool_hole_diameter/2-5-separation/2, 0, 0]) {
	difference() {
		union() {
			//spacer/end cap
			cylinder(r=spool_hole_diameter/2+5, h=spacer, center=false);
			//spool contact
			translate([0, 0, spacer]) cylinder(r=spool_hole_diameter/2, h=spool_hole_depth/2, center=false);
		}
		//axel hole
		translate([0, 0, -1]) cylinder(r=axel_diameter/2, h=(spacer+spool_hole_depth/2+2), center=false);
	}
}

//Left bearing
translate([spool_hole_diameter/2+5+separation/2, 0, 0]) {
	difference() {
		union() {
			//spacer/end cap
			cylinder(r=spool_hole_diameter/2+5, h=spacer, center=false);
			//spool contact
			translate([0, 0, spacer]) cylinder(r=spool_hole_diameter/2, h=spool_hole_depth/2, center=false);
		}
		//axel hole
		translate([0, 0, -1]) cylinder(r=axel_diameter/2, h=(spacer+spool_hole_depth/2+2), center=false);
	}
}
